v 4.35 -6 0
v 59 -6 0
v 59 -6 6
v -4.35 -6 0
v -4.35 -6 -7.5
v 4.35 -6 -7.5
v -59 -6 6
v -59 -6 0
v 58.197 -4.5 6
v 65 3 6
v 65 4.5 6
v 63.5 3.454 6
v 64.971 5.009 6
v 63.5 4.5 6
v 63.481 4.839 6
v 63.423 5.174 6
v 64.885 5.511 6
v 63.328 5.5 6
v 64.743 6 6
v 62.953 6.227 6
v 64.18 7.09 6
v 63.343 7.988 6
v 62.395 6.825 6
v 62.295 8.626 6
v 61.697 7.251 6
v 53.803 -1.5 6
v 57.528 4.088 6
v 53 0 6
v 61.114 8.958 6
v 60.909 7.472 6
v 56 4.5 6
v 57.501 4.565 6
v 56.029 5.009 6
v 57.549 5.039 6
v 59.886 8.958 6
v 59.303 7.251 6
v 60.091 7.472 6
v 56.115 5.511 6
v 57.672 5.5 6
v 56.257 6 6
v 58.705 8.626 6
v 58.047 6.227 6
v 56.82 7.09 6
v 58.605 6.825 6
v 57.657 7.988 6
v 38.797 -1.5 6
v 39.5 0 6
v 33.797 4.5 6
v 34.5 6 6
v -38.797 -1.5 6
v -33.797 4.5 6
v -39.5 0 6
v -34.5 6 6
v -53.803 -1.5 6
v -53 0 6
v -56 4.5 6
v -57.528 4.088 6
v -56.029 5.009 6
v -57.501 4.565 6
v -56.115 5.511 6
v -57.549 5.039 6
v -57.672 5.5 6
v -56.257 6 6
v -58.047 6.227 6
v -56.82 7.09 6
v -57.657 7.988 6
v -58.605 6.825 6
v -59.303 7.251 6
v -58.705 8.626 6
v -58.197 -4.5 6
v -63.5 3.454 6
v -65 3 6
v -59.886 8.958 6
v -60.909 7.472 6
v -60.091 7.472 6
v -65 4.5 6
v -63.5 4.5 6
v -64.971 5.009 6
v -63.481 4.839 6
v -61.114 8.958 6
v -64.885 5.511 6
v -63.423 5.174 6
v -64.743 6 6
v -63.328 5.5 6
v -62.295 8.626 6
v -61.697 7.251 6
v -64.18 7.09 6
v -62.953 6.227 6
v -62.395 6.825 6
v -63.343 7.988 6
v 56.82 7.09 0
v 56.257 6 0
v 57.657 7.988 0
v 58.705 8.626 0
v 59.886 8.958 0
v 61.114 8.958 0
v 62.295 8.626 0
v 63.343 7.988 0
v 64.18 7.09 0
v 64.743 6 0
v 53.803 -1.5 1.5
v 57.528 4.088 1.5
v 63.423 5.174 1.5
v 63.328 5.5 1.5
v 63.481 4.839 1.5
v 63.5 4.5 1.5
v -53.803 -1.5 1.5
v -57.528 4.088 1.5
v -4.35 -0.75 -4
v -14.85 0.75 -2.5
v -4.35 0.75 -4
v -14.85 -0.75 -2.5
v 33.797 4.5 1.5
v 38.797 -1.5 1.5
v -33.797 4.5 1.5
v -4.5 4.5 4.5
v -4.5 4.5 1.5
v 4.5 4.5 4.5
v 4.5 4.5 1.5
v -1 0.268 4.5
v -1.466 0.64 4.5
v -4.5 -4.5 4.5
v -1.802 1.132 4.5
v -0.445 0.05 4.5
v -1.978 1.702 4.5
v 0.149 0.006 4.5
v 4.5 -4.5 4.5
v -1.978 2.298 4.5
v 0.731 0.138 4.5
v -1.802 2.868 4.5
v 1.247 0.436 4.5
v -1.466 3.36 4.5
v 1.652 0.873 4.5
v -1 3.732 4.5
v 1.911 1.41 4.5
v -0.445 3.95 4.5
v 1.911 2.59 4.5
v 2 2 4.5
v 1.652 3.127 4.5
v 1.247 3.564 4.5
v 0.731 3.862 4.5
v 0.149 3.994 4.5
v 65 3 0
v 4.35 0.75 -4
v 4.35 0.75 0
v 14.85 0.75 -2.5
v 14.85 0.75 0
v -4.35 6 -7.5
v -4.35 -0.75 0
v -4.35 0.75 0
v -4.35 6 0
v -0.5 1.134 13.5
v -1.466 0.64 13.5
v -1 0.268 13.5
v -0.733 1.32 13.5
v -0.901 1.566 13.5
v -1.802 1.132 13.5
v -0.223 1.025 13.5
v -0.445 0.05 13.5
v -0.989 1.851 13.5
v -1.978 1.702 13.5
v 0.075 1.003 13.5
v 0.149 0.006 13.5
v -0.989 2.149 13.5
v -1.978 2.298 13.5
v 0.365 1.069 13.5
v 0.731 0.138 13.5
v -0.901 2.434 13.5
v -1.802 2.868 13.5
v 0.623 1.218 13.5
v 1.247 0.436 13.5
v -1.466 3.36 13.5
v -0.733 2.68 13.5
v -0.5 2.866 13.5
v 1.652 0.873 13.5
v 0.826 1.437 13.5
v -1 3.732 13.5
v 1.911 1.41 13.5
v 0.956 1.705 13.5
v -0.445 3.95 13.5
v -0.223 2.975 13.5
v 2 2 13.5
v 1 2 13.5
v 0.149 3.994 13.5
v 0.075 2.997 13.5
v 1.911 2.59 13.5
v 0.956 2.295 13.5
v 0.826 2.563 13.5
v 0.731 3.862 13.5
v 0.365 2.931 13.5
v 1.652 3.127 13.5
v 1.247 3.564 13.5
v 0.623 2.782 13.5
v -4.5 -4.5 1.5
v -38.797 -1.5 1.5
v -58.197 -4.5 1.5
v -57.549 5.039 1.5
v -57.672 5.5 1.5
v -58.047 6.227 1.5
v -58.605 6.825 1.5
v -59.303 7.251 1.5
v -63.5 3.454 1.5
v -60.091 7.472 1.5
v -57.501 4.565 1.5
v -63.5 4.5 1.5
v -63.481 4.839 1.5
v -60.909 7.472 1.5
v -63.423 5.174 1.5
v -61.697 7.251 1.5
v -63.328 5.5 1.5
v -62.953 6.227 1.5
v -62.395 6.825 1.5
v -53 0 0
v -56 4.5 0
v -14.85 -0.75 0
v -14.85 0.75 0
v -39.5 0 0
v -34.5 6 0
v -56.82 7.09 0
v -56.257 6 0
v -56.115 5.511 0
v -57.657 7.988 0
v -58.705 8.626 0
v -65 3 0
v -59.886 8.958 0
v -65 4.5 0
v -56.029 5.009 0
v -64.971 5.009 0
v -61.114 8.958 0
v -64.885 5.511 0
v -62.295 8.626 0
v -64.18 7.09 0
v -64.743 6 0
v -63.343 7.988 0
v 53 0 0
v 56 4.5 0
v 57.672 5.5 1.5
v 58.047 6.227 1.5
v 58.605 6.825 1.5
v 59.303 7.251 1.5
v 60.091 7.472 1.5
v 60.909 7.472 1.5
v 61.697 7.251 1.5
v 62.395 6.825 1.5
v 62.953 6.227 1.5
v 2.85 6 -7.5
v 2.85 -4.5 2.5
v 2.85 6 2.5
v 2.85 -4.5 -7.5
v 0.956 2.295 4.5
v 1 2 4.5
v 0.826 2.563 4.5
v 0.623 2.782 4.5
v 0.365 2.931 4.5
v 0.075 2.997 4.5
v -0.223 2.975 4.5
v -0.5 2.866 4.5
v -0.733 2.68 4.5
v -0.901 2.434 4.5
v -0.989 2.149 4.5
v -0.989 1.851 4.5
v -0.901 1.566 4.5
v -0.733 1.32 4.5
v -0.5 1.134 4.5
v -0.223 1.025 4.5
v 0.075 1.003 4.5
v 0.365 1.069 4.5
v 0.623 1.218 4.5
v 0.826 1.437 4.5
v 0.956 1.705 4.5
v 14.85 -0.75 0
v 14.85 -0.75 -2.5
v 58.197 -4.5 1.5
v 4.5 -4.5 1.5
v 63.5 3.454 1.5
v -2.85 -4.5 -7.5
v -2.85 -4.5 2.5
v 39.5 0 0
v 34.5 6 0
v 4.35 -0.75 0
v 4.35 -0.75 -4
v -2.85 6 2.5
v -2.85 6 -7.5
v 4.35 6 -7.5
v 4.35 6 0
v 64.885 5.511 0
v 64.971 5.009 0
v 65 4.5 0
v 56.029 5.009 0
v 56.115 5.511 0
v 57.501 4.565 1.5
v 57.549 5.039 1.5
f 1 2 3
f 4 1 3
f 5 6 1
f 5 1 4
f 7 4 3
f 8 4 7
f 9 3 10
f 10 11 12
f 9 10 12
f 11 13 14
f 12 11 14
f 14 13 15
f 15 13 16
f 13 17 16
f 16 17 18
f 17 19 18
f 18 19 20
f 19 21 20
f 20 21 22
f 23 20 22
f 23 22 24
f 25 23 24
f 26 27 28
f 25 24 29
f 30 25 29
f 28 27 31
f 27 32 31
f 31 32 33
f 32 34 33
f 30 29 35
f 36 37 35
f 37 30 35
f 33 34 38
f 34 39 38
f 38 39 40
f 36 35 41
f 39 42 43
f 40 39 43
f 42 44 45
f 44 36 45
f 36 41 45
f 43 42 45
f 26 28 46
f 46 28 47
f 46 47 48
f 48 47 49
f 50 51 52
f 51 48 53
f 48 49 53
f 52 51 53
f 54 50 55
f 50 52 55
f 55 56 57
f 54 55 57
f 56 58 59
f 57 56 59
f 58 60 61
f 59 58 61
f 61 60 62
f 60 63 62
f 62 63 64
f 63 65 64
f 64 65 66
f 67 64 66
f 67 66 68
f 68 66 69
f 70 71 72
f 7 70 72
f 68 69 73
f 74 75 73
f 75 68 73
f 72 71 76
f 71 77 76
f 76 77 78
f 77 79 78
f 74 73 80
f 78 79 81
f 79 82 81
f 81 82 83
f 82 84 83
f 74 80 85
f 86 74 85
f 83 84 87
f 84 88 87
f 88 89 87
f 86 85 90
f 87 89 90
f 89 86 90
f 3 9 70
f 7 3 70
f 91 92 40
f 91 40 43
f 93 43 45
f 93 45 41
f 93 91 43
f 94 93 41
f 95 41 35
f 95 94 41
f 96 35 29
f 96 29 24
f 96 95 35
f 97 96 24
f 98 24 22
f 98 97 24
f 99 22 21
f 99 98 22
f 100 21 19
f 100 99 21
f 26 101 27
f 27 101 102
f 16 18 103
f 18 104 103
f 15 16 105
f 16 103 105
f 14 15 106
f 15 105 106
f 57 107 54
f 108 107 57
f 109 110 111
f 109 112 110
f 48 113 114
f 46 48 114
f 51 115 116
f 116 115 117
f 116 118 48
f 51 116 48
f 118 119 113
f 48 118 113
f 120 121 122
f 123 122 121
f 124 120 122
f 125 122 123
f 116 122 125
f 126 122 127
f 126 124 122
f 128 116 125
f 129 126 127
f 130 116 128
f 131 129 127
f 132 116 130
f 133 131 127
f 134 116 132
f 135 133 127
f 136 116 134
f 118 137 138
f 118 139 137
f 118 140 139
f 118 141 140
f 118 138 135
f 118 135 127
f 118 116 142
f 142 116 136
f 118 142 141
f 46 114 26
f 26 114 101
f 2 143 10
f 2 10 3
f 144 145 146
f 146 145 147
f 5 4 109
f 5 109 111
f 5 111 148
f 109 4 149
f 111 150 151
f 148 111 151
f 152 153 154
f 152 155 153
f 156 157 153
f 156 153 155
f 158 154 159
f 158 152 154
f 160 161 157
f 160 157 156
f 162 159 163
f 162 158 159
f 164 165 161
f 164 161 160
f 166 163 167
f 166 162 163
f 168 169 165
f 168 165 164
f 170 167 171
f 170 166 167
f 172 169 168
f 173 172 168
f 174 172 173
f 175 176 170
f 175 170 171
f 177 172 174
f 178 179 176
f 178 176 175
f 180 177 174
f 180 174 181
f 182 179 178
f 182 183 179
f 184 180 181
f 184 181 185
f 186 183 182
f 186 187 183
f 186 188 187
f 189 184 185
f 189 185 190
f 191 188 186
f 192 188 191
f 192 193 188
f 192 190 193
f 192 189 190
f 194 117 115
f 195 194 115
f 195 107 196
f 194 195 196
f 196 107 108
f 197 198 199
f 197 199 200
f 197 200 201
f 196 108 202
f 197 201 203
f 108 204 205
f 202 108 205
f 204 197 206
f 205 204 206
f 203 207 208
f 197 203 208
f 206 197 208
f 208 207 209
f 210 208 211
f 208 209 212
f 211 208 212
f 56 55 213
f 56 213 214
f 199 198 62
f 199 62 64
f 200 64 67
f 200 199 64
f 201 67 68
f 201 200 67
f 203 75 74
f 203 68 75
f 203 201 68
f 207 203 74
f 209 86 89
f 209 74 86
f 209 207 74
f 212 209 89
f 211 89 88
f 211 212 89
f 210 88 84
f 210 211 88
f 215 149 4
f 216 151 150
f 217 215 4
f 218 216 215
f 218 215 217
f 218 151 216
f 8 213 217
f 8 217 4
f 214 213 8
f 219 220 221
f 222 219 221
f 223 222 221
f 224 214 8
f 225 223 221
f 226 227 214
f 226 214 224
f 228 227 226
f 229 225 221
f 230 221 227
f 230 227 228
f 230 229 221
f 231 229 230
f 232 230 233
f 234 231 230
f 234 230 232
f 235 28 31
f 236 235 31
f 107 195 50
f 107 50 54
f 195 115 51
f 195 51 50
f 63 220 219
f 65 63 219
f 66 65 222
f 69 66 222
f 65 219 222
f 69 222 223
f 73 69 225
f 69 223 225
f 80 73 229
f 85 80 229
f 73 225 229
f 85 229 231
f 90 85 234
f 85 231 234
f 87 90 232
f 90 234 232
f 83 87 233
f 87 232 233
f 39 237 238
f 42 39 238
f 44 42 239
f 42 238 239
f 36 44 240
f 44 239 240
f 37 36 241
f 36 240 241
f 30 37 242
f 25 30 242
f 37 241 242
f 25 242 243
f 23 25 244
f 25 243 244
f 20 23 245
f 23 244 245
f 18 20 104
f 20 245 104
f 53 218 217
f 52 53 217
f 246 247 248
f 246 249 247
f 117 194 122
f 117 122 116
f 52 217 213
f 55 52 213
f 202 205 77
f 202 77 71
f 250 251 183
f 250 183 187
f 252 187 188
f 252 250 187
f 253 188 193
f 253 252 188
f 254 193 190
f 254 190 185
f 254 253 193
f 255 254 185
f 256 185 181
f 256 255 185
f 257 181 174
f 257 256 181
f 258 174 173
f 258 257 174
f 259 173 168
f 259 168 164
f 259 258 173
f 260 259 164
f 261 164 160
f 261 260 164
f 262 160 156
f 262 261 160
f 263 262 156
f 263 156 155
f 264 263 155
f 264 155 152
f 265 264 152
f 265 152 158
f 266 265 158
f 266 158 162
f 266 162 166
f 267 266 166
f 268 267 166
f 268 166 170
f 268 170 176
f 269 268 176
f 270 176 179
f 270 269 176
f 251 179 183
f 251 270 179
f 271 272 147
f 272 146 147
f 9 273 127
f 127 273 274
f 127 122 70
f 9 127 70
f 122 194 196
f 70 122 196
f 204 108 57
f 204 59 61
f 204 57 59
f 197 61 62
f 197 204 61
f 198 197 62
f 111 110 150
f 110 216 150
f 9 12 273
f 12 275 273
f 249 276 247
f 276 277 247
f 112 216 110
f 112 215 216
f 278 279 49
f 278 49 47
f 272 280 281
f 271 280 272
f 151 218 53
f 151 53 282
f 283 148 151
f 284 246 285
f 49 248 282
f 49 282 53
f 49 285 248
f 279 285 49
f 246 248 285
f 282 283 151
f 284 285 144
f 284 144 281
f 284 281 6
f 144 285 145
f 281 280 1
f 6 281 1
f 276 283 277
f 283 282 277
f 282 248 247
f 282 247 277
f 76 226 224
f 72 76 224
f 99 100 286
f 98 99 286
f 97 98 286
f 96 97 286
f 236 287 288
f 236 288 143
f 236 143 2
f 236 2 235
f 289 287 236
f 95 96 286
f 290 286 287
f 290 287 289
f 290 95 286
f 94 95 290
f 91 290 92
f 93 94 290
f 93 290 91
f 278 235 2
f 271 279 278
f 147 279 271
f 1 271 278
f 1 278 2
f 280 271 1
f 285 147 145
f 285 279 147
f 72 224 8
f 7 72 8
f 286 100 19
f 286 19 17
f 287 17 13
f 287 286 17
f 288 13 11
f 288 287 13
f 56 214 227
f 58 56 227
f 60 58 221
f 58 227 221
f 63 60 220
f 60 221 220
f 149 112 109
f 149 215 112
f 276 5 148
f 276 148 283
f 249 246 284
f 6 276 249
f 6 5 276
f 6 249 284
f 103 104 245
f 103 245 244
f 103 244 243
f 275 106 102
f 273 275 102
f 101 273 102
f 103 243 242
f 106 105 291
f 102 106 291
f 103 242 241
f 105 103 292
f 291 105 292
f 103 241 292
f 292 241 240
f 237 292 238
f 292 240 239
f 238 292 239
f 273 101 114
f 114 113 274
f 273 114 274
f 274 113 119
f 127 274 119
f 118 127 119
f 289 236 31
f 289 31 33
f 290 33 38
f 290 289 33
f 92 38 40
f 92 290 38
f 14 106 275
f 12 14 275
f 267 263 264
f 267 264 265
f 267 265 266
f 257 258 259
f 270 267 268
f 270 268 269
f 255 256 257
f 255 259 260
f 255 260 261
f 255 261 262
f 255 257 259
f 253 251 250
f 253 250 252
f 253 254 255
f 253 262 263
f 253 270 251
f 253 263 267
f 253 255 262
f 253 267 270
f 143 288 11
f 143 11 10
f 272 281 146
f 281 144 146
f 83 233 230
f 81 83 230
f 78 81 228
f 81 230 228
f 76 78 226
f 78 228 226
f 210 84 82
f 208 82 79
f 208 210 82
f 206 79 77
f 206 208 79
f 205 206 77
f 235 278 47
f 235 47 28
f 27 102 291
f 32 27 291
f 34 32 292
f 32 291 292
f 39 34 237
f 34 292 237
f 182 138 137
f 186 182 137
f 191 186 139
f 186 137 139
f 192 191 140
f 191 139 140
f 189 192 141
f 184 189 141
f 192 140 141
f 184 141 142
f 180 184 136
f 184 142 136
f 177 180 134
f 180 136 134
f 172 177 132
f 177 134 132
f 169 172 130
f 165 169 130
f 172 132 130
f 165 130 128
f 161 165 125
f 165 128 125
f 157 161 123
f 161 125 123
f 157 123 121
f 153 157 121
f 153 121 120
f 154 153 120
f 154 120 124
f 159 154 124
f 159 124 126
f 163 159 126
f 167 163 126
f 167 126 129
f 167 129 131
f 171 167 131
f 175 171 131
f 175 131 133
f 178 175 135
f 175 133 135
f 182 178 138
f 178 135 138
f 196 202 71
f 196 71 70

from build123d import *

# Parameters (mm, degrees)
F1_DEPTH  = 6
F3_T      = -1.5
F4_R      = 1
F5_DEPTH  = 26
F6_W      = 9
F6_H      = 9
F7_DEPTH  = 3
F8_R      = 2
F8_R_2    = 1
F9_DEPTH  = 9
F11_DEPTH = 7.5
F12_DEPTH = 2.5
F14_DEPTH = 0.75


# Not quite as in the source:
# - a feature names something its author has since deleted; it is built from what else it names


with BuildPart() as f1:
    # F0 (on Top) → F1 (new body)
    with BuildSketch(Plane.XY):
        with BuildLine():
            Line((-65, 4.5), (-65, 3))
            Line((-65, 3), (-59, -6))
            Line((-59, -6), (0, -6))
            Line((0, -6), (0, 6))
            Line((0, 6), (-34.5, 6))
            Line((-34.5, 6), (-39.5, 0))
            Line((-39.5, 0), (-53, 0))
            Line((-53, 0), (-56, 4.5))
            ThreePointArc((-56, 4.5), (-60.5, 0), (-65, 4.5))
        make_face()
        with BuildLine():
            ThreePointArc((-64.7426406871, 6), (-64.9351935184, 5.2609589043), (-65, 4.5))
            ThreePointArc((-65, 4.5), (-60.5, 0), (-56, 4.5))
            ThreePointArc((-56, 4.5), (-56.0648064816, 5.2609589043), (-56.2573593129, 6))
            Line((-56.2573593129, 6), (-64.7426406871, 6))
        make_face()
        with BuildLine():
            ThreePointArc((-56.2573593129, 6), (-60.5, 9), (-64.7426406871, 6))
            Line((-64.7426406871, 6), (-56.2573593129, 6))
        make_face()
    extrude(amount=F1_DEPTH)

    # F2: F1 across plane


with BuildPart() as f1_1:
    add(f1.part)
    add(f1.part.mirror(Plane.YZ))

    # F3
    f3_openings = [f1_1.faces().sort_by_distance(p)[0] for p in [
        (0, -0.200074, 6),
    ]]
    offset(amount=F3_T, openings=f3_openings, kind=Kind.INTERSECTION)

    # F4 (on face) → F5 (cut)
    with BuildSketch(Plane.XY.offset(1.5)):
        with BuildLine():
            ThreePointArc((-57.5283708886, 4.0883928763), (-57.5071011265, 4.2937081366), (-57.5, 4.5))
            ThreePointArc((-57.5, 4.5), (-60.5, 7.5), (-63.5, 4.5))
            ThreePointArc((-63.5, 4.5), (-60.7062918634, 1.5071011265), (-57.5283708886, 4.0883928763))
        make_face()
        with Locations((-60.5, 4.5)):
            Circle(F4_R, mode=Mode.SUBTRACT)
    extrude(amount=F5_DEPTH, mode=Mode.SUBTRACT)

    # F6 (on face) → F7 (join)
    with BuildSketch(Plane.XY.offset(1.5)):
        Rectangle(F6_W, F6_H)
    extrude(amount=F7_DEPTH)

    # F8 (on face) → F9 (join)
    with BuildSketch(Plane.XY.offset(4.5)):
        with Locations((0, 2)):
            Circle(F8_R)
        with Locations((0, 2)):
            Circle(F8_R_2, mode=Mode.SUBTRACT)
    extrude(amount=F9_DEPTH)

    # F10 (on face) → F11 (join)
    with BuildSketch(Plane(origin=(0, 0, 0), x_dir=(1, 0, 0), z_dir=(0, 0, -1))):
        Polygon((4.35, 6), (-4.35, 6), (-4.35, -6), (-2.85, -6), (-2.85, 4.5), (2.85, 4.5), (2.85, -6), (4.35, -6), align=None)
    extrude(amount=F11_DEPTH)

    # F12 (cut): a face of the model
    f12_faces = [f1_1.faces().sort_by_distance(p)[0] for p in [
        (0, 0.75, 0),
    ]]
    extrude(f12_faces, amount=-F12_DEPTH, mode=Mode.SUBTRACT)

    # F13 (on Front) → F14 (join, symmetric)
    with BuildSketch(Plane.XZ):
        Polygon((4.35, 0), (4.35, -4), (14.85, -2.5), (14.85, 0), align=None)
        Polygon((-14.85, -2.5), (-4.35, -4), (-4.35, 0), (-14.85, 0), align=None)
    extrude(amount=F14_DEPTH, both=True)


solid = f1_1.part
